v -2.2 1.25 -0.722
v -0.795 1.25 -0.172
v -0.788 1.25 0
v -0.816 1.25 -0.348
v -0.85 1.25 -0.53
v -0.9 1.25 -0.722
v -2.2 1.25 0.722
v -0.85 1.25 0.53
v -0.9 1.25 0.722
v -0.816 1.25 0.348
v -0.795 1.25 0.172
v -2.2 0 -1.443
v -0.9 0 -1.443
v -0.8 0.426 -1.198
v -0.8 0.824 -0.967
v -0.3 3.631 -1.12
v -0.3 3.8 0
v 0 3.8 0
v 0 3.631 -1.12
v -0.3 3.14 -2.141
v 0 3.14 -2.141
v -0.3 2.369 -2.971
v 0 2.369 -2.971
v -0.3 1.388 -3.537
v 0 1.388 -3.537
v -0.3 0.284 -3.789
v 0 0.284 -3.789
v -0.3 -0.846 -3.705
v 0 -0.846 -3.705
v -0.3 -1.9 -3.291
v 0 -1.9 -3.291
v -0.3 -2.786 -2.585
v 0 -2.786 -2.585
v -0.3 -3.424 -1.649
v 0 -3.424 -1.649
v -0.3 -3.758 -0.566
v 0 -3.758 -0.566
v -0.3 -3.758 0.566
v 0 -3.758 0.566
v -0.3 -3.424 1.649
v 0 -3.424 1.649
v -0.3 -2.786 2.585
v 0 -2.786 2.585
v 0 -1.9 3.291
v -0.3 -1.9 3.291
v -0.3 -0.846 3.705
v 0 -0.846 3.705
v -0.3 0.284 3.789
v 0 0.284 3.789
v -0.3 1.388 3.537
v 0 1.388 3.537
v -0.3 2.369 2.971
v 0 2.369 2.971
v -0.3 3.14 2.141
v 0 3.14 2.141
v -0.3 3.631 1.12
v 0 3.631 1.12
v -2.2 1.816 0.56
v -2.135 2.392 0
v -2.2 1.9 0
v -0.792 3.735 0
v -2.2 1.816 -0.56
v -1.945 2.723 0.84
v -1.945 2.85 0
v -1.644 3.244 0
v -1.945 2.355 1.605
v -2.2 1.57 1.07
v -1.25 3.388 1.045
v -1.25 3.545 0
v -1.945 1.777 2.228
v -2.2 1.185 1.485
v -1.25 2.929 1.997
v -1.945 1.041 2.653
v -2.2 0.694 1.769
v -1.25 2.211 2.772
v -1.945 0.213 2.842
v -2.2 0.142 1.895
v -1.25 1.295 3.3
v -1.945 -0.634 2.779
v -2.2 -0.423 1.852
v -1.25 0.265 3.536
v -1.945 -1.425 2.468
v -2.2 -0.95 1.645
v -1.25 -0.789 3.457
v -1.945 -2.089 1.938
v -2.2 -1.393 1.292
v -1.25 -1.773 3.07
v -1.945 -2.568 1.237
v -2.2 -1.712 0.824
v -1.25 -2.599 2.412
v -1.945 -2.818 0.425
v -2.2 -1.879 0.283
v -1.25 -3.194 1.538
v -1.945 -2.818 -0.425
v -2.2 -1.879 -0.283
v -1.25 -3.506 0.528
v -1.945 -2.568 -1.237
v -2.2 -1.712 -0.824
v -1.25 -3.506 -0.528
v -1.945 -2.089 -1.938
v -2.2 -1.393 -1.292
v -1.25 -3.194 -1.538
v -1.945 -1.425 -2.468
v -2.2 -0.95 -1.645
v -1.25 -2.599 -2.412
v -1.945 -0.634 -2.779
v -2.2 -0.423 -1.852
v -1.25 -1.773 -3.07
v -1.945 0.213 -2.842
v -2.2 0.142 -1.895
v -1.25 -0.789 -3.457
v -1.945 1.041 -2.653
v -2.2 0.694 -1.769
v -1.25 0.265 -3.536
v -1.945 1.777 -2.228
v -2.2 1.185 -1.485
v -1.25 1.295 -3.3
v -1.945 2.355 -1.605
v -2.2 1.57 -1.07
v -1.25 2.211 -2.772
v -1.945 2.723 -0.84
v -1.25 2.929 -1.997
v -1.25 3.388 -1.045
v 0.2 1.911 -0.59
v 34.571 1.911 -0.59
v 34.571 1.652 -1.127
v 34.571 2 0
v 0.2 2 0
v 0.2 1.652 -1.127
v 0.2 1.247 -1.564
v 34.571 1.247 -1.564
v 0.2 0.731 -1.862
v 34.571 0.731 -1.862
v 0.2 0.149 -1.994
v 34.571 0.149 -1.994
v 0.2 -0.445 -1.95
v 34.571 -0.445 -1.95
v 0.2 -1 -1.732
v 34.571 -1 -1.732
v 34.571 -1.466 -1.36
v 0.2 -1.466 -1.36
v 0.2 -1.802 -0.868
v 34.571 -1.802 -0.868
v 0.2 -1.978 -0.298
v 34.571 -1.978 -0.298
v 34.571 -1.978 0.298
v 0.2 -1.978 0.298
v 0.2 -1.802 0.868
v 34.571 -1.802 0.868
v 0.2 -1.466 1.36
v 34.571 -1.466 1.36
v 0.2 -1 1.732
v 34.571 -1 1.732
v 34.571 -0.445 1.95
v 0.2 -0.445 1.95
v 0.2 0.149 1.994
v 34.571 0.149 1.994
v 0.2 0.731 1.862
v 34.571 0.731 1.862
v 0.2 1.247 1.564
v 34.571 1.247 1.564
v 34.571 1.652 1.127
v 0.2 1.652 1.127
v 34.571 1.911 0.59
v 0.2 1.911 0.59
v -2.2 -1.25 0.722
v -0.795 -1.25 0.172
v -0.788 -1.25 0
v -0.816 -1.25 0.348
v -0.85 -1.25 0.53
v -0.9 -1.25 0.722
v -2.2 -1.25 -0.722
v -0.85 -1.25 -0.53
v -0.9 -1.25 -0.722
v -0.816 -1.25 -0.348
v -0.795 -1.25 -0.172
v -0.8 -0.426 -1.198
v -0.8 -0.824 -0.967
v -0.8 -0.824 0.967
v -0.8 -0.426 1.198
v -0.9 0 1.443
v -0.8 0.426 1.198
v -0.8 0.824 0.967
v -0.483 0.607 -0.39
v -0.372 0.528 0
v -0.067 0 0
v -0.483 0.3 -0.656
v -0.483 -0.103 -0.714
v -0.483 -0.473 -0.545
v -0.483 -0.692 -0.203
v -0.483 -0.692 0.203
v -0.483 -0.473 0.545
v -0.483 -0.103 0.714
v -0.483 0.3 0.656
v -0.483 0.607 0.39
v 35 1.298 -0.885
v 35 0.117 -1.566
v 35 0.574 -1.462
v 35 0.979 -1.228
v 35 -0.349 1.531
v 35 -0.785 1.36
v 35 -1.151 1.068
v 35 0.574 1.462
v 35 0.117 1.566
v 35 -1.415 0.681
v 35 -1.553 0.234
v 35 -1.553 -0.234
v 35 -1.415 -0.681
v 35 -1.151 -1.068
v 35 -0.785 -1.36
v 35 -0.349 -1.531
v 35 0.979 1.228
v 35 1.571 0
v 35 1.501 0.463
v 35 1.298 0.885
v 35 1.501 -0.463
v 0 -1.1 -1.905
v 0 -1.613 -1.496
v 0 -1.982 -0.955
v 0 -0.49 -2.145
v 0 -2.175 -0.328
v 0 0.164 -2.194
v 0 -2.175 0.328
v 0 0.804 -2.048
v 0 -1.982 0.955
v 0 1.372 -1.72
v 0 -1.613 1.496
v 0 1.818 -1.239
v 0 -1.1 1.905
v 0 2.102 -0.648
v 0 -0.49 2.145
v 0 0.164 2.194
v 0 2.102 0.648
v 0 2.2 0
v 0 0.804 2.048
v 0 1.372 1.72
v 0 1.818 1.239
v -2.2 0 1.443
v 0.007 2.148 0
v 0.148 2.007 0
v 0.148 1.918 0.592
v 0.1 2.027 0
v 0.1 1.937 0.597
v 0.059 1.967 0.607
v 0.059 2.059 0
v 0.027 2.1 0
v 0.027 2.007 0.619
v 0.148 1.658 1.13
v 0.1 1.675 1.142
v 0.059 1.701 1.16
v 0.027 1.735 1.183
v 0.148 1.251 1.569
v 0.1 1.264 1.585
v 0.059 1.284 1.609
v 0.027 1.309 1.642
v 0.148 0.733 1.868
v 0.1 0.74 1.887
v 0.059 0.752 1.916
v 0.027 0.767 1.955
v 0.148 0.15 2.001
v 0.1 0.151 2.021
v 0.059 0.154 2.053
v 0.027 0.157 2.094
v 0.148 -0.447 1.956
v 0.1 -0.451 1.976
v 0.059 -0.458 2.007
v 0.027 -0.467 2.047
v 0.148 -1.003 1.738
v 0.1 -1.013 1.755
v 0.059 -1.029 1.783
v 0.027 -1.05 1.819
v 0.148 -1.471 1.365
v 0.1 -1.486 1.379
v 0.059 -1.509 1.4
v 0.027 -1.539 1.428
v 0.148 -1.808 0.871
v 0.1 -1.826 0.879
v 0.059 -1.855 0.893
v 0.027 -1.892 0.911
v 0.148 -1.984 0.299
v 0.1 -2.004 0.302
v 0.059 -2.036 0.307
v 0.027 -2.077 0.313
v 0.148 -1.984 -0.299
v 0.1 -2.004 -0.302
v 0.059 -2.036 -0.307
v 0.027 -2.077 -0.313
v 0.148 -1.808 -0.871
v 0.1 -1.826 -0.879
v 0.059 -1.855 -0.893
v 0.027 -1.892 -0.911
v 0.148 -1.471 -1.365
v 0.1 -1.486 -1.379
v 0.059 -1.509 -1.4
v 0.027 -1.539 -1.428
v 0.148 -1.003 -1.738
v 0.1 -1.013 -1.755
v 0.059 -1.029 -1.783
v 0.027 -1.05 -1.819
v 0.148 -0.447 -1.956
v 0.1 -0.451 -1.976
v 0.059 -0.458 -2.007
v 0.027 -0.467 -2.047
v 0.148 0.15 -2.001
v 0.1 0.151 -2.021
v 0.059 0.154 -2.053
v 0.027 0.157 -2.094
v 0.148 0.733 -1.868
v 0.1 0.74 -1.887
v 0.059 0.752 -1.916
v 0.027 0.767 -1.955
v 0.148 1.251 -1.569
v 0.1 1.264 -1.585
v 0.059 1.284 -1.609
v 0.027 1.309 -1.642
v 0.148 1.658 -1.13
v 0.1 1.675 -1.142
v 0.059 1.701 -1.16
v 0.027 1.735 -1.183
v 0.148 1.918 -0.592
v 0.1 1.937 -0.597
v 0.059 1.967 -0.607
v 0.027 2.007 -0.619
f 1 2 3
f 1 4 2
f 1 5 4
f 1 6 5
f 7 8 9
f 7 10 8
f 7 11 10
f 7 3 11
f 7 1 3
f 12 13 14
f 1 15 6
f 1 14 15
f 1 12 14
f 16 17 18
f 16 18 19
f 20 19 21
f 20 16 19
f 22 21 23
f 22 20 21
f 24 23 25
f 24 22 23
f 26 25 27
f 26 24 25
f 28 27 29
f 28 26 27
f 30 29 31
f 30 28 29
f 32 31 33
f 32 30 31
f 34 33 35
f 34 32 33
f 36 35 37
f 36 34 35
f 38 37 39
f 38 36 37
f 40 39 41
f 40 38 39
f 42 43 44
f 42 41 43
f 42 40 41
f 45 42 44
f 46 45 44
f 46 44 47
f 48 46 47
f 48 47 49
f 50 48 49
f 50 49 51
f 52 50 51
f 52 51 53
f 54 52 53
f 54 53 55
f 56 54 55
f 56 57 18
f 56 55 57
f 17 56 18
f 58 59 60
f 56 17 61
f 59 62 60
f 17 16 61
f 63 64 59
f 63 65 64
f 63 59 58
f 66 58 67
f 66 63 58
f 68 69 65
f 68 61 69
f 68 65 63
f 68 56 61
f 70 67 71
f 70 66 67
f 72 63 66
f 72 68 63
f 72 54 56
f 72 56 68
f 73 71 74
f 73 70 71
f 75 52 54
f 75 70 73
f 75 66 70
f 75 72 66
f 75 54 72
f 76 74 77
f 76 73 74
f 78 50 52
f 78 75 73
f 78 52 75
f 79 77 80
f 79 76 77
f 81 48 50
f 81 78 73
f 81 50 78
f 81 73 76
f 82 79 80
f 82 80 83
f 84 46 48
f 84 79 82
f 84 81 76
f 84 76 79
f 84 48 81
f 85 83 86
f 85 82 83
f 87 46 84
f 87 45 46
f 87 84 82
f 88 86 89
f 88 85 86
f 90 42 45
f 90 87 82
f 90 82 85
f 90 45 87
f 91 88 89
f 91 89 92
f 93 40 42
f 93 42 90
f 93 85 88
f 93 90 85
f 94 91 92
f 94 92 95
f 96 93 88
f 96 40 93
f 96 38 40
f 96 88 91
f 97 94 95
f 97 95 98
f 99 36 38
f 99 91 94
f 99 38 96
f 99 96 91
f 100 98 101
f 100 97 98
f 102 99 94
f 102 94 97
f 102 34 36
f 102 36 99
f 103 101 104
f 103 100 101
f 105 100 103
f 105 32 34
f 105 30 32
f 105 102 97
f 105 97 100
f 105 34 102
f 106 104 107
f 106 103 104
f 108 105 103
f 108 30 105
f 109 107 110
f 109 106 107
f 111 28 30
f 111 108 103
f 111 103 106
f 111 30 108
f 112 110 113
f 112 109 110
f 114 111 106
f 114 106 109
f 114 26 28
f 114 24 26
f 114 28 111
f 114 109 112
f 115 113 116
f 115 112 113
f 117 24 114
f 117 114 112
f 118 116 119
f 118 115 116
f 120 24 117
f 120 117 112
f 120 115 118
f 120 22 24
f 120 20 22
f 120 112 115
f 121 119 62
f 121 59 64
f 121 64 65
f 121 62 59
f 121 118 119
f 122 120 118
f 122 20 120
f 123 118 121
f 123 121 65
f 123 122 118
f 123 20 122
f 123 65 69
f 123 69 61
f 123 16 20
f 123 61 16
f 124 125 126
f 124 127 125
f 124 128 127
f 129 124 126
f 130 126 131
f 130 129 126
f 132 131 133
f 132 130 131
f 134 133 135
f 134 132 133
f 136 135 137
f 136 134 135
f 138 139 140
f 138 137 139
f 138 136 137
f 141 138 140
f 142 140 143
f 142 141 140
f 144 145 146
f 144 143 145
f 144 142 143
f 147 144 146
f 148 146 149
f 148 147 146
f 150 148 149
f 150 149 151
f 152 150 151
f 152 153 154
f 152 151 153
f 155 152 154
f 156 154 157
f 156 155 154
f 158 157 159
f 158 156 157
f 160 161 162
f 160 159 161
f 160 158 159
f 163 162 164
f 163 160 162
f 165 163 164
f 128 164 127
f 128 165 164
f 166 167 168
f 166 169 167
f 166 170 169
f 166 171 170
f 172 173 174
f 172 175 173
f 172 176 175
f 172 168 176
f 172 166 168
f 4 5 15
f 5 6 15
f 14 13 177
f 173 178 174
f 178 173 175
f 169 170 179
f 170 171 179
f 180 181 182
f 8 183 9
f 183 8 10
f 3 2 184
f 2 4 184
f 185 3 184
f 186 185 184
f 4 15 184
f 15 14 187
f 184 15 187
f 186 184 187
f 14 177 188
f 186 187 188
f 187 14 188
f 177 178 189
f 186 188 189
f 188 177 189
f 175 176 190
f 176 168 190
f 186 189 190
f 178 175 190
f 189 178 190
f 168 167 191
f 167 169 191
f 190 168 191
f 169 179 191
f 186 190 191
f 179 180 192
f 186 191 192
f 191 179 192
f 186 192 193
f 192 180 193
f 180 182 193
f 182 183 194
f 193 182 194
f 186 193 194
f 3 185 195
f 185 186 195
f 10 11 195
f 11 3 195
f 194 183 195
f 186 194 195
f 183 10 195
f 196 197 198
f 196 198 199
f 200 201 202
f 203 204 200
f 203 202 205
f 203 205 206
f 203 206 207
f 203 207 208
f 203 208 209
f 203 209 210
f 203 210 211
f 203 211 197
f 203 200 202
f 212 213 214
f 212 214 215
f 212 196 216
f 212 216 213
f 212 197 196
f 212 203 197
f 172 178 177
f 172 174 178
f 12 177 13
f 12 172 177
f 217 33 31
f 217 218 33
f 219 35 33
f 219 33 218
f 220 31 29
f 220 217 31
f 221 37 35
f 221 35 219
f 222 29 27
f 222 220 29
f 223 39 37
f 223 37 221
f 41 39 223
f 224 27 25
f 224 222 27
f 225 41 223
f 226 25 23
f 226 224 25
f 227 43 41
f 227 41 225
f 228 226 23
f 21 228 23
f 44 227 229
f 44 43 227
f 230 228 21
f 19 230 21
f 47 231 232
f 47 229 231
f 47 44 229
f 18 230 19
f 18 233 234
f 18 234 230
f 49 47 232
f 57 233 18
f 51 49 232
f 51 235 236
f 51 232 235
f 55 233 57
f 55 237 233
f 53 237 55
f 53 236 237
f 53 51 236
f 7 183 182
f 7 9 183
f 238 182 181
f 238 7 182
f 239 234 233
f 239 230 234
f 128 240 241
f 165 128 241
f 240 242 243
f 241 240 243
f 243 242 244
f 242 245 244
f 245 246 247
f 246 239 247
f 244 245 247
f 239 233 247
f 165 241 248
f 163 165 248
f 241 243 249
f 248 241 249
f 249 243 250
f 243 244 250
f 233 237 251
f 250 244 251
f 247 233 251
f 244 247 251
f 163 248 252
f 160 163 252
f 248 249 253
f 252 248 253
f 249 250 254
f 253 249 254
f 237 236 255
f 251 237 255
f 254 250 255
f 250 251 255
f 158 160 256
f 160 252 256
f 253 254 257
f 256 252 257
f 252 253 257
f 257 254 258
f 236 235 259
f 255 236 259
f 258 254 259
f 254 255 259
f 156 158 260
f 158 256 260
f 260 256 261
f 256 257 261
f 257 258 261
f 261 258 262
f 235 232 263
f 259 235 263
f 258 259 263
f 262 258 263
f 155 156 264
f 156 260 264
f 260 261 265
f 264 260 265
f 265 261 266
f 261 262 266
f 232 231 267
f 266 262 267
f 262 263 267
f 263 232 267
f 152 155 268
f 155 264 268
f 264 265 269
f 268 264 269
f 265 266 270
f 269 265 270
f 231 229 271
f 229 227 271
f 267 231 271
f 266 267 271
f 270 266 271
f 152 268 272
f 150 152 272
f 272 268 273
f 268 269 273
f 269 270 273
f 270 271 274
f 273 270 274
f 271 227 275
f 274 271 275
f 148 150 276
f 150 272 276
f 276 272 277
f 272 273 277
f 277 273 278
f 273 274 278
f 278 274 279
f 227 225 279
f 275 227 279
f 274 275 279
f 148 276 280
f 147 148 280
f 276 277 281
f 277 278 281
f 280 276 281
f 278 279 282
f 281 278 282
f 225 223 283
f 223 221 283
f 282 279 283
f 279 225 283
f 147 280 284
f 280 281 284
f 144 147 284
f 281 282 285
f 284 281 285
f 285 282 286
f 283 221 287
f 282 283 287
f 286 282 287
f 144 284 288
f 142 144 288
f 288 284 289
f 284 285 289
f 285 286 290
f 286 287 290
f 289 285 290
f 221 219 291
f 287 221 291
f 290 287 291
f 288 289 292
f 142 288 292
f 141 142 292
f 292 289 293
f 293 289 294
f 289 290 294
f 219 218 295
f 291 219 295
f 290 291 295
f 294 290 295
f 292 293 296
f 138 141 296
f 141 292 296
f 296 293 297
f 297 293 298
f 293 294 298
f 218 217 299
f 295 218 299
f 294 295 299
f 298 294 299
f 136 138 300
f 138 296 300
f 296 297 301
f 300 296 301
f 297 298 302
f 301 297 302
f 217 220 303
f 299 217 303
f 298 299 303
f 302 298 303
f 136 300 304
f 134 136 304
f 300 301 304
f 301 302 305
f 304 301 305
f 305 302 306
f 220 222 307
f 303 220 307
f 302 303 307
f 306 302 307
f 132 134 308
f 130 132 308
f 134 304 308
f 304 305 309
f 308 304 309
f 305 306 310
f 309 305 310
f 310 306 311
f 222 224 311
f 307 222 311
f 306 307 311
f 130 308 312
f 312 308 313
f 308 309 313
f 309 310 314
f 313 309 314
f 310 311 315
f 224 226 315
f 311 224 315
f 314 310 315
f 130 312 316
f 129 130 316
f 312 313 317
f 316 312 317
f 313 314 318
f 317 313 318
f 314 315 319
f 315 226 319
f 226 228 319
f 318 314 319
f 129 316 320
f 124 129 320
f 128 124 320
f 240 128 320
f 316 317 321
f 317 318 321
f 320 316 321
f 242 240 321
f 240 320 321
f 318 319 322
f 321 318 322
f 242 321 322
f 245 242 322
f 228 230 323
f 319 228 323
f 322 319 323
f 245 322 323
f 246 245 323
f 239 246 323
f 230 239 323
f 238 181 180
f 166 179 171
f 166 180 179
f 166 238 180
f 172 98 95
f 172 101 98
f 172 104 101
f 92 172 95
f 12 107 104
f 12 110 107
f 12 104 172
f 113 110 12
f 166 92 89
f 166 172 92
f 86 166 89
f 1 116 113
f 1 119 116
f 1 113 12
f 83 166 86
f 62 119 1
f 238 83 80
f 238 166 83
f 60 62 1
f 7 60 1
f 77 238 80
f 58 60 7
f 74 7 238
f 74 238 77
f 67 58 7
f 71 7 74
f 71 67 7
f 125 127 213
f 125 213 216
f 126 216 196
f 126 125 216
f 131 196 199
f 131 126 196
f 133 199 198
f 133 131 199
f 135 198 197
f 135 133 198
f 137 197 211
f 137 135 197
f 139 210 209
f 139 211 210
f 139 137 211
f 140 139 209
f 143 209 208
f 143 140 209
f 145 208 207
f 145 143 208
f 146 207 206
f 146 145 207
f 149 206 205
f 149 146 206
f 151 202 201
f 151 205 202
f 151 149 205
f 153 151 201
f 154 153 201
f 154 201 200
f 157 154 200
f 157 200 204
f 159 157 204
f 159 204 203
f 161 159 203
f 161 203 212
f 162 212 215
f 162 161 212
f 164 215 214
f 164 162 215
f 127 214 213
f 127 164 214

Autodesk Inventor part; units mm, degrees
ref_plane "YZ Plane" through (0, 0, 0) normal (1, 0, 0) x (0, 1, 0)
ref_plane "XZ Plane" through (0, 0, 0) normal (0, 1, 0) x (-1, 0, 0)
sketch "Skizze1" plane through (0, 0, 0) normal (0, 0, 1) x (1, 0, 0)
  line L0 (-0.0667, 0) -> (35, 0)
  line L1 (35, 0) -> (35, 2)
  line L2 (35, 2) -> (15, 2)
  line L3 (15, 2) -> (14.5705, 2)
  line L4 (14.5705, 2) -> (0, 2)
  line L5 (0, 2) -> (0, 3.8)
  line L6 (0, 3.8) -> (-2.2, 3.8)
  line L7 (-2.2, 3.8) -> (-2.2, 1.4434)
  line L8 (-2.2, 1.4434) -> (-0.9, 1.4434)
  line L9 (-0.9, 1.4434) -> (-0.0667, 0)
  line L10 (-9.64, 0) -> (42.44, 0) projected
  line L11 (0, -0.76) -> (0, 4.56) projected
  line L12 (15, 2) -> (0, 2) construction
  dimension "d1" = 20
  dimension "d2" = 0.4295
  dimension "d3" = 2.2
  dimension "d4" = 1.3
  dimension "d5" = 60
  dimension "d6" = 4
  dimension "d7" = 4
  dimension "d8" = 2.8868
  dimension "d9" = 7.6
  dimension "d26" = 35
revolve "Körper" add sketch "Skizze1" angle 360 about axis through (-0.0667, 0, 0) along (1, 0, 0)
sketch "Skizze2" plane through (-2.2, 0, 0) normal (-1, 0, 0) x (0, 0, 1)
  circle A0 centre (0, 0) radius 1.4434 projected
  line L0 (0, -5.32) -> (0, 5.32) projected
  line L1 (-5.32, 0) -> (5.32, 0) projected
  line L2 (1.4434, 0) -> (0.7217, -1.25)
  line L3 (0.7217, -1.25) -> (-0.7217, -1.25)
  line L4 (-0.7217, -1.25) -> (-1.4434, 0)
  line L5 (-1.4434, 0) -> (-0.7217, 1.25)
  line L6 (-0.7217, 1.25) -> (0.7217, 1.25)
  line L7 (0.7217, 1.25) -> (1.4434, 0)
extrude "Loch" add sketch "Skizze2" against normal up to next contours L7 A0 | A0 L2 | L6 L0 A0 | A0 L0 L3 | L0 L6 A0 | A0 L3 L0 | L4 A0 | A0 L5
fillet "Rundung1" radius 1.9 1 edges at (-2.2, -3.8, 0)
thread "Gewinde" size "M4x0.7" class "6g" standard "ISO Metric profile" length 20
chamfer "Fase1" distance 0.4294 distance2 0.4294 1 edges at (35, -2, 0) measured on face at (35, 0.0262, -0.4421)
ref_plane "Work Plane1" through (29, 0, 0) normal (0, -1, 0) x (1, 0, 0)
fillet "Rundung2" radius 0.2 1 edges at (0, -2, 0)
equation "\"d1\" = GEL"
equation "\"d3\" = KOH"
equation "\"d4\" = INTI"
equation "\"d6\" = GD"
equation "\"d7\" = BDM"
equation "\"d8\" = 1.1547 * SW"
equation "\"d9\" = KOD"
equation "\"d26\" = NLG"
equation "\"d17\" = RR"
equation "\"d13\" = GEL"
equation "\"d15\" = -0.5 * SPD + 0.5 * GD"
equation "\"d16\" = GUL"
equation "\"d30\" = R"
equation "\"GD\" = NND"
equation "\"NLG\" = 35"
equation "\"GEL\" = 20"
equation "\"KOD\" = 7.6"
equation "\"KOH\" = 2.2"
equation "\"INTI\" = 1.3"
equation "\"GAL\" = 0.61345 * PTC"
equation "\"GUL\" = 0.61345 * PTC"
equation "\"BDM\" = NND"
equation "\"SW\" = 2.5"
equation "\"RR\" = 1.9"
equation "\"SPD\" = NND - 1.2269 * PTC"
equation "\"R\" = 0.2"
equation "\"TOA\" = 30deg"
equation "\"GD1\" = THREADDIA - 1.2269 * PTC"
equation "\"THREADDIA\" = 4"
equation "\"PTC\" = 0.7"
equation "\"NND\" = 4"
equation "\"KOH1\" = 0.3"
equation "\"E0\" = 2.873"
properties part number "ISO 7380-1 - M4 x 35" material "Stahl"
